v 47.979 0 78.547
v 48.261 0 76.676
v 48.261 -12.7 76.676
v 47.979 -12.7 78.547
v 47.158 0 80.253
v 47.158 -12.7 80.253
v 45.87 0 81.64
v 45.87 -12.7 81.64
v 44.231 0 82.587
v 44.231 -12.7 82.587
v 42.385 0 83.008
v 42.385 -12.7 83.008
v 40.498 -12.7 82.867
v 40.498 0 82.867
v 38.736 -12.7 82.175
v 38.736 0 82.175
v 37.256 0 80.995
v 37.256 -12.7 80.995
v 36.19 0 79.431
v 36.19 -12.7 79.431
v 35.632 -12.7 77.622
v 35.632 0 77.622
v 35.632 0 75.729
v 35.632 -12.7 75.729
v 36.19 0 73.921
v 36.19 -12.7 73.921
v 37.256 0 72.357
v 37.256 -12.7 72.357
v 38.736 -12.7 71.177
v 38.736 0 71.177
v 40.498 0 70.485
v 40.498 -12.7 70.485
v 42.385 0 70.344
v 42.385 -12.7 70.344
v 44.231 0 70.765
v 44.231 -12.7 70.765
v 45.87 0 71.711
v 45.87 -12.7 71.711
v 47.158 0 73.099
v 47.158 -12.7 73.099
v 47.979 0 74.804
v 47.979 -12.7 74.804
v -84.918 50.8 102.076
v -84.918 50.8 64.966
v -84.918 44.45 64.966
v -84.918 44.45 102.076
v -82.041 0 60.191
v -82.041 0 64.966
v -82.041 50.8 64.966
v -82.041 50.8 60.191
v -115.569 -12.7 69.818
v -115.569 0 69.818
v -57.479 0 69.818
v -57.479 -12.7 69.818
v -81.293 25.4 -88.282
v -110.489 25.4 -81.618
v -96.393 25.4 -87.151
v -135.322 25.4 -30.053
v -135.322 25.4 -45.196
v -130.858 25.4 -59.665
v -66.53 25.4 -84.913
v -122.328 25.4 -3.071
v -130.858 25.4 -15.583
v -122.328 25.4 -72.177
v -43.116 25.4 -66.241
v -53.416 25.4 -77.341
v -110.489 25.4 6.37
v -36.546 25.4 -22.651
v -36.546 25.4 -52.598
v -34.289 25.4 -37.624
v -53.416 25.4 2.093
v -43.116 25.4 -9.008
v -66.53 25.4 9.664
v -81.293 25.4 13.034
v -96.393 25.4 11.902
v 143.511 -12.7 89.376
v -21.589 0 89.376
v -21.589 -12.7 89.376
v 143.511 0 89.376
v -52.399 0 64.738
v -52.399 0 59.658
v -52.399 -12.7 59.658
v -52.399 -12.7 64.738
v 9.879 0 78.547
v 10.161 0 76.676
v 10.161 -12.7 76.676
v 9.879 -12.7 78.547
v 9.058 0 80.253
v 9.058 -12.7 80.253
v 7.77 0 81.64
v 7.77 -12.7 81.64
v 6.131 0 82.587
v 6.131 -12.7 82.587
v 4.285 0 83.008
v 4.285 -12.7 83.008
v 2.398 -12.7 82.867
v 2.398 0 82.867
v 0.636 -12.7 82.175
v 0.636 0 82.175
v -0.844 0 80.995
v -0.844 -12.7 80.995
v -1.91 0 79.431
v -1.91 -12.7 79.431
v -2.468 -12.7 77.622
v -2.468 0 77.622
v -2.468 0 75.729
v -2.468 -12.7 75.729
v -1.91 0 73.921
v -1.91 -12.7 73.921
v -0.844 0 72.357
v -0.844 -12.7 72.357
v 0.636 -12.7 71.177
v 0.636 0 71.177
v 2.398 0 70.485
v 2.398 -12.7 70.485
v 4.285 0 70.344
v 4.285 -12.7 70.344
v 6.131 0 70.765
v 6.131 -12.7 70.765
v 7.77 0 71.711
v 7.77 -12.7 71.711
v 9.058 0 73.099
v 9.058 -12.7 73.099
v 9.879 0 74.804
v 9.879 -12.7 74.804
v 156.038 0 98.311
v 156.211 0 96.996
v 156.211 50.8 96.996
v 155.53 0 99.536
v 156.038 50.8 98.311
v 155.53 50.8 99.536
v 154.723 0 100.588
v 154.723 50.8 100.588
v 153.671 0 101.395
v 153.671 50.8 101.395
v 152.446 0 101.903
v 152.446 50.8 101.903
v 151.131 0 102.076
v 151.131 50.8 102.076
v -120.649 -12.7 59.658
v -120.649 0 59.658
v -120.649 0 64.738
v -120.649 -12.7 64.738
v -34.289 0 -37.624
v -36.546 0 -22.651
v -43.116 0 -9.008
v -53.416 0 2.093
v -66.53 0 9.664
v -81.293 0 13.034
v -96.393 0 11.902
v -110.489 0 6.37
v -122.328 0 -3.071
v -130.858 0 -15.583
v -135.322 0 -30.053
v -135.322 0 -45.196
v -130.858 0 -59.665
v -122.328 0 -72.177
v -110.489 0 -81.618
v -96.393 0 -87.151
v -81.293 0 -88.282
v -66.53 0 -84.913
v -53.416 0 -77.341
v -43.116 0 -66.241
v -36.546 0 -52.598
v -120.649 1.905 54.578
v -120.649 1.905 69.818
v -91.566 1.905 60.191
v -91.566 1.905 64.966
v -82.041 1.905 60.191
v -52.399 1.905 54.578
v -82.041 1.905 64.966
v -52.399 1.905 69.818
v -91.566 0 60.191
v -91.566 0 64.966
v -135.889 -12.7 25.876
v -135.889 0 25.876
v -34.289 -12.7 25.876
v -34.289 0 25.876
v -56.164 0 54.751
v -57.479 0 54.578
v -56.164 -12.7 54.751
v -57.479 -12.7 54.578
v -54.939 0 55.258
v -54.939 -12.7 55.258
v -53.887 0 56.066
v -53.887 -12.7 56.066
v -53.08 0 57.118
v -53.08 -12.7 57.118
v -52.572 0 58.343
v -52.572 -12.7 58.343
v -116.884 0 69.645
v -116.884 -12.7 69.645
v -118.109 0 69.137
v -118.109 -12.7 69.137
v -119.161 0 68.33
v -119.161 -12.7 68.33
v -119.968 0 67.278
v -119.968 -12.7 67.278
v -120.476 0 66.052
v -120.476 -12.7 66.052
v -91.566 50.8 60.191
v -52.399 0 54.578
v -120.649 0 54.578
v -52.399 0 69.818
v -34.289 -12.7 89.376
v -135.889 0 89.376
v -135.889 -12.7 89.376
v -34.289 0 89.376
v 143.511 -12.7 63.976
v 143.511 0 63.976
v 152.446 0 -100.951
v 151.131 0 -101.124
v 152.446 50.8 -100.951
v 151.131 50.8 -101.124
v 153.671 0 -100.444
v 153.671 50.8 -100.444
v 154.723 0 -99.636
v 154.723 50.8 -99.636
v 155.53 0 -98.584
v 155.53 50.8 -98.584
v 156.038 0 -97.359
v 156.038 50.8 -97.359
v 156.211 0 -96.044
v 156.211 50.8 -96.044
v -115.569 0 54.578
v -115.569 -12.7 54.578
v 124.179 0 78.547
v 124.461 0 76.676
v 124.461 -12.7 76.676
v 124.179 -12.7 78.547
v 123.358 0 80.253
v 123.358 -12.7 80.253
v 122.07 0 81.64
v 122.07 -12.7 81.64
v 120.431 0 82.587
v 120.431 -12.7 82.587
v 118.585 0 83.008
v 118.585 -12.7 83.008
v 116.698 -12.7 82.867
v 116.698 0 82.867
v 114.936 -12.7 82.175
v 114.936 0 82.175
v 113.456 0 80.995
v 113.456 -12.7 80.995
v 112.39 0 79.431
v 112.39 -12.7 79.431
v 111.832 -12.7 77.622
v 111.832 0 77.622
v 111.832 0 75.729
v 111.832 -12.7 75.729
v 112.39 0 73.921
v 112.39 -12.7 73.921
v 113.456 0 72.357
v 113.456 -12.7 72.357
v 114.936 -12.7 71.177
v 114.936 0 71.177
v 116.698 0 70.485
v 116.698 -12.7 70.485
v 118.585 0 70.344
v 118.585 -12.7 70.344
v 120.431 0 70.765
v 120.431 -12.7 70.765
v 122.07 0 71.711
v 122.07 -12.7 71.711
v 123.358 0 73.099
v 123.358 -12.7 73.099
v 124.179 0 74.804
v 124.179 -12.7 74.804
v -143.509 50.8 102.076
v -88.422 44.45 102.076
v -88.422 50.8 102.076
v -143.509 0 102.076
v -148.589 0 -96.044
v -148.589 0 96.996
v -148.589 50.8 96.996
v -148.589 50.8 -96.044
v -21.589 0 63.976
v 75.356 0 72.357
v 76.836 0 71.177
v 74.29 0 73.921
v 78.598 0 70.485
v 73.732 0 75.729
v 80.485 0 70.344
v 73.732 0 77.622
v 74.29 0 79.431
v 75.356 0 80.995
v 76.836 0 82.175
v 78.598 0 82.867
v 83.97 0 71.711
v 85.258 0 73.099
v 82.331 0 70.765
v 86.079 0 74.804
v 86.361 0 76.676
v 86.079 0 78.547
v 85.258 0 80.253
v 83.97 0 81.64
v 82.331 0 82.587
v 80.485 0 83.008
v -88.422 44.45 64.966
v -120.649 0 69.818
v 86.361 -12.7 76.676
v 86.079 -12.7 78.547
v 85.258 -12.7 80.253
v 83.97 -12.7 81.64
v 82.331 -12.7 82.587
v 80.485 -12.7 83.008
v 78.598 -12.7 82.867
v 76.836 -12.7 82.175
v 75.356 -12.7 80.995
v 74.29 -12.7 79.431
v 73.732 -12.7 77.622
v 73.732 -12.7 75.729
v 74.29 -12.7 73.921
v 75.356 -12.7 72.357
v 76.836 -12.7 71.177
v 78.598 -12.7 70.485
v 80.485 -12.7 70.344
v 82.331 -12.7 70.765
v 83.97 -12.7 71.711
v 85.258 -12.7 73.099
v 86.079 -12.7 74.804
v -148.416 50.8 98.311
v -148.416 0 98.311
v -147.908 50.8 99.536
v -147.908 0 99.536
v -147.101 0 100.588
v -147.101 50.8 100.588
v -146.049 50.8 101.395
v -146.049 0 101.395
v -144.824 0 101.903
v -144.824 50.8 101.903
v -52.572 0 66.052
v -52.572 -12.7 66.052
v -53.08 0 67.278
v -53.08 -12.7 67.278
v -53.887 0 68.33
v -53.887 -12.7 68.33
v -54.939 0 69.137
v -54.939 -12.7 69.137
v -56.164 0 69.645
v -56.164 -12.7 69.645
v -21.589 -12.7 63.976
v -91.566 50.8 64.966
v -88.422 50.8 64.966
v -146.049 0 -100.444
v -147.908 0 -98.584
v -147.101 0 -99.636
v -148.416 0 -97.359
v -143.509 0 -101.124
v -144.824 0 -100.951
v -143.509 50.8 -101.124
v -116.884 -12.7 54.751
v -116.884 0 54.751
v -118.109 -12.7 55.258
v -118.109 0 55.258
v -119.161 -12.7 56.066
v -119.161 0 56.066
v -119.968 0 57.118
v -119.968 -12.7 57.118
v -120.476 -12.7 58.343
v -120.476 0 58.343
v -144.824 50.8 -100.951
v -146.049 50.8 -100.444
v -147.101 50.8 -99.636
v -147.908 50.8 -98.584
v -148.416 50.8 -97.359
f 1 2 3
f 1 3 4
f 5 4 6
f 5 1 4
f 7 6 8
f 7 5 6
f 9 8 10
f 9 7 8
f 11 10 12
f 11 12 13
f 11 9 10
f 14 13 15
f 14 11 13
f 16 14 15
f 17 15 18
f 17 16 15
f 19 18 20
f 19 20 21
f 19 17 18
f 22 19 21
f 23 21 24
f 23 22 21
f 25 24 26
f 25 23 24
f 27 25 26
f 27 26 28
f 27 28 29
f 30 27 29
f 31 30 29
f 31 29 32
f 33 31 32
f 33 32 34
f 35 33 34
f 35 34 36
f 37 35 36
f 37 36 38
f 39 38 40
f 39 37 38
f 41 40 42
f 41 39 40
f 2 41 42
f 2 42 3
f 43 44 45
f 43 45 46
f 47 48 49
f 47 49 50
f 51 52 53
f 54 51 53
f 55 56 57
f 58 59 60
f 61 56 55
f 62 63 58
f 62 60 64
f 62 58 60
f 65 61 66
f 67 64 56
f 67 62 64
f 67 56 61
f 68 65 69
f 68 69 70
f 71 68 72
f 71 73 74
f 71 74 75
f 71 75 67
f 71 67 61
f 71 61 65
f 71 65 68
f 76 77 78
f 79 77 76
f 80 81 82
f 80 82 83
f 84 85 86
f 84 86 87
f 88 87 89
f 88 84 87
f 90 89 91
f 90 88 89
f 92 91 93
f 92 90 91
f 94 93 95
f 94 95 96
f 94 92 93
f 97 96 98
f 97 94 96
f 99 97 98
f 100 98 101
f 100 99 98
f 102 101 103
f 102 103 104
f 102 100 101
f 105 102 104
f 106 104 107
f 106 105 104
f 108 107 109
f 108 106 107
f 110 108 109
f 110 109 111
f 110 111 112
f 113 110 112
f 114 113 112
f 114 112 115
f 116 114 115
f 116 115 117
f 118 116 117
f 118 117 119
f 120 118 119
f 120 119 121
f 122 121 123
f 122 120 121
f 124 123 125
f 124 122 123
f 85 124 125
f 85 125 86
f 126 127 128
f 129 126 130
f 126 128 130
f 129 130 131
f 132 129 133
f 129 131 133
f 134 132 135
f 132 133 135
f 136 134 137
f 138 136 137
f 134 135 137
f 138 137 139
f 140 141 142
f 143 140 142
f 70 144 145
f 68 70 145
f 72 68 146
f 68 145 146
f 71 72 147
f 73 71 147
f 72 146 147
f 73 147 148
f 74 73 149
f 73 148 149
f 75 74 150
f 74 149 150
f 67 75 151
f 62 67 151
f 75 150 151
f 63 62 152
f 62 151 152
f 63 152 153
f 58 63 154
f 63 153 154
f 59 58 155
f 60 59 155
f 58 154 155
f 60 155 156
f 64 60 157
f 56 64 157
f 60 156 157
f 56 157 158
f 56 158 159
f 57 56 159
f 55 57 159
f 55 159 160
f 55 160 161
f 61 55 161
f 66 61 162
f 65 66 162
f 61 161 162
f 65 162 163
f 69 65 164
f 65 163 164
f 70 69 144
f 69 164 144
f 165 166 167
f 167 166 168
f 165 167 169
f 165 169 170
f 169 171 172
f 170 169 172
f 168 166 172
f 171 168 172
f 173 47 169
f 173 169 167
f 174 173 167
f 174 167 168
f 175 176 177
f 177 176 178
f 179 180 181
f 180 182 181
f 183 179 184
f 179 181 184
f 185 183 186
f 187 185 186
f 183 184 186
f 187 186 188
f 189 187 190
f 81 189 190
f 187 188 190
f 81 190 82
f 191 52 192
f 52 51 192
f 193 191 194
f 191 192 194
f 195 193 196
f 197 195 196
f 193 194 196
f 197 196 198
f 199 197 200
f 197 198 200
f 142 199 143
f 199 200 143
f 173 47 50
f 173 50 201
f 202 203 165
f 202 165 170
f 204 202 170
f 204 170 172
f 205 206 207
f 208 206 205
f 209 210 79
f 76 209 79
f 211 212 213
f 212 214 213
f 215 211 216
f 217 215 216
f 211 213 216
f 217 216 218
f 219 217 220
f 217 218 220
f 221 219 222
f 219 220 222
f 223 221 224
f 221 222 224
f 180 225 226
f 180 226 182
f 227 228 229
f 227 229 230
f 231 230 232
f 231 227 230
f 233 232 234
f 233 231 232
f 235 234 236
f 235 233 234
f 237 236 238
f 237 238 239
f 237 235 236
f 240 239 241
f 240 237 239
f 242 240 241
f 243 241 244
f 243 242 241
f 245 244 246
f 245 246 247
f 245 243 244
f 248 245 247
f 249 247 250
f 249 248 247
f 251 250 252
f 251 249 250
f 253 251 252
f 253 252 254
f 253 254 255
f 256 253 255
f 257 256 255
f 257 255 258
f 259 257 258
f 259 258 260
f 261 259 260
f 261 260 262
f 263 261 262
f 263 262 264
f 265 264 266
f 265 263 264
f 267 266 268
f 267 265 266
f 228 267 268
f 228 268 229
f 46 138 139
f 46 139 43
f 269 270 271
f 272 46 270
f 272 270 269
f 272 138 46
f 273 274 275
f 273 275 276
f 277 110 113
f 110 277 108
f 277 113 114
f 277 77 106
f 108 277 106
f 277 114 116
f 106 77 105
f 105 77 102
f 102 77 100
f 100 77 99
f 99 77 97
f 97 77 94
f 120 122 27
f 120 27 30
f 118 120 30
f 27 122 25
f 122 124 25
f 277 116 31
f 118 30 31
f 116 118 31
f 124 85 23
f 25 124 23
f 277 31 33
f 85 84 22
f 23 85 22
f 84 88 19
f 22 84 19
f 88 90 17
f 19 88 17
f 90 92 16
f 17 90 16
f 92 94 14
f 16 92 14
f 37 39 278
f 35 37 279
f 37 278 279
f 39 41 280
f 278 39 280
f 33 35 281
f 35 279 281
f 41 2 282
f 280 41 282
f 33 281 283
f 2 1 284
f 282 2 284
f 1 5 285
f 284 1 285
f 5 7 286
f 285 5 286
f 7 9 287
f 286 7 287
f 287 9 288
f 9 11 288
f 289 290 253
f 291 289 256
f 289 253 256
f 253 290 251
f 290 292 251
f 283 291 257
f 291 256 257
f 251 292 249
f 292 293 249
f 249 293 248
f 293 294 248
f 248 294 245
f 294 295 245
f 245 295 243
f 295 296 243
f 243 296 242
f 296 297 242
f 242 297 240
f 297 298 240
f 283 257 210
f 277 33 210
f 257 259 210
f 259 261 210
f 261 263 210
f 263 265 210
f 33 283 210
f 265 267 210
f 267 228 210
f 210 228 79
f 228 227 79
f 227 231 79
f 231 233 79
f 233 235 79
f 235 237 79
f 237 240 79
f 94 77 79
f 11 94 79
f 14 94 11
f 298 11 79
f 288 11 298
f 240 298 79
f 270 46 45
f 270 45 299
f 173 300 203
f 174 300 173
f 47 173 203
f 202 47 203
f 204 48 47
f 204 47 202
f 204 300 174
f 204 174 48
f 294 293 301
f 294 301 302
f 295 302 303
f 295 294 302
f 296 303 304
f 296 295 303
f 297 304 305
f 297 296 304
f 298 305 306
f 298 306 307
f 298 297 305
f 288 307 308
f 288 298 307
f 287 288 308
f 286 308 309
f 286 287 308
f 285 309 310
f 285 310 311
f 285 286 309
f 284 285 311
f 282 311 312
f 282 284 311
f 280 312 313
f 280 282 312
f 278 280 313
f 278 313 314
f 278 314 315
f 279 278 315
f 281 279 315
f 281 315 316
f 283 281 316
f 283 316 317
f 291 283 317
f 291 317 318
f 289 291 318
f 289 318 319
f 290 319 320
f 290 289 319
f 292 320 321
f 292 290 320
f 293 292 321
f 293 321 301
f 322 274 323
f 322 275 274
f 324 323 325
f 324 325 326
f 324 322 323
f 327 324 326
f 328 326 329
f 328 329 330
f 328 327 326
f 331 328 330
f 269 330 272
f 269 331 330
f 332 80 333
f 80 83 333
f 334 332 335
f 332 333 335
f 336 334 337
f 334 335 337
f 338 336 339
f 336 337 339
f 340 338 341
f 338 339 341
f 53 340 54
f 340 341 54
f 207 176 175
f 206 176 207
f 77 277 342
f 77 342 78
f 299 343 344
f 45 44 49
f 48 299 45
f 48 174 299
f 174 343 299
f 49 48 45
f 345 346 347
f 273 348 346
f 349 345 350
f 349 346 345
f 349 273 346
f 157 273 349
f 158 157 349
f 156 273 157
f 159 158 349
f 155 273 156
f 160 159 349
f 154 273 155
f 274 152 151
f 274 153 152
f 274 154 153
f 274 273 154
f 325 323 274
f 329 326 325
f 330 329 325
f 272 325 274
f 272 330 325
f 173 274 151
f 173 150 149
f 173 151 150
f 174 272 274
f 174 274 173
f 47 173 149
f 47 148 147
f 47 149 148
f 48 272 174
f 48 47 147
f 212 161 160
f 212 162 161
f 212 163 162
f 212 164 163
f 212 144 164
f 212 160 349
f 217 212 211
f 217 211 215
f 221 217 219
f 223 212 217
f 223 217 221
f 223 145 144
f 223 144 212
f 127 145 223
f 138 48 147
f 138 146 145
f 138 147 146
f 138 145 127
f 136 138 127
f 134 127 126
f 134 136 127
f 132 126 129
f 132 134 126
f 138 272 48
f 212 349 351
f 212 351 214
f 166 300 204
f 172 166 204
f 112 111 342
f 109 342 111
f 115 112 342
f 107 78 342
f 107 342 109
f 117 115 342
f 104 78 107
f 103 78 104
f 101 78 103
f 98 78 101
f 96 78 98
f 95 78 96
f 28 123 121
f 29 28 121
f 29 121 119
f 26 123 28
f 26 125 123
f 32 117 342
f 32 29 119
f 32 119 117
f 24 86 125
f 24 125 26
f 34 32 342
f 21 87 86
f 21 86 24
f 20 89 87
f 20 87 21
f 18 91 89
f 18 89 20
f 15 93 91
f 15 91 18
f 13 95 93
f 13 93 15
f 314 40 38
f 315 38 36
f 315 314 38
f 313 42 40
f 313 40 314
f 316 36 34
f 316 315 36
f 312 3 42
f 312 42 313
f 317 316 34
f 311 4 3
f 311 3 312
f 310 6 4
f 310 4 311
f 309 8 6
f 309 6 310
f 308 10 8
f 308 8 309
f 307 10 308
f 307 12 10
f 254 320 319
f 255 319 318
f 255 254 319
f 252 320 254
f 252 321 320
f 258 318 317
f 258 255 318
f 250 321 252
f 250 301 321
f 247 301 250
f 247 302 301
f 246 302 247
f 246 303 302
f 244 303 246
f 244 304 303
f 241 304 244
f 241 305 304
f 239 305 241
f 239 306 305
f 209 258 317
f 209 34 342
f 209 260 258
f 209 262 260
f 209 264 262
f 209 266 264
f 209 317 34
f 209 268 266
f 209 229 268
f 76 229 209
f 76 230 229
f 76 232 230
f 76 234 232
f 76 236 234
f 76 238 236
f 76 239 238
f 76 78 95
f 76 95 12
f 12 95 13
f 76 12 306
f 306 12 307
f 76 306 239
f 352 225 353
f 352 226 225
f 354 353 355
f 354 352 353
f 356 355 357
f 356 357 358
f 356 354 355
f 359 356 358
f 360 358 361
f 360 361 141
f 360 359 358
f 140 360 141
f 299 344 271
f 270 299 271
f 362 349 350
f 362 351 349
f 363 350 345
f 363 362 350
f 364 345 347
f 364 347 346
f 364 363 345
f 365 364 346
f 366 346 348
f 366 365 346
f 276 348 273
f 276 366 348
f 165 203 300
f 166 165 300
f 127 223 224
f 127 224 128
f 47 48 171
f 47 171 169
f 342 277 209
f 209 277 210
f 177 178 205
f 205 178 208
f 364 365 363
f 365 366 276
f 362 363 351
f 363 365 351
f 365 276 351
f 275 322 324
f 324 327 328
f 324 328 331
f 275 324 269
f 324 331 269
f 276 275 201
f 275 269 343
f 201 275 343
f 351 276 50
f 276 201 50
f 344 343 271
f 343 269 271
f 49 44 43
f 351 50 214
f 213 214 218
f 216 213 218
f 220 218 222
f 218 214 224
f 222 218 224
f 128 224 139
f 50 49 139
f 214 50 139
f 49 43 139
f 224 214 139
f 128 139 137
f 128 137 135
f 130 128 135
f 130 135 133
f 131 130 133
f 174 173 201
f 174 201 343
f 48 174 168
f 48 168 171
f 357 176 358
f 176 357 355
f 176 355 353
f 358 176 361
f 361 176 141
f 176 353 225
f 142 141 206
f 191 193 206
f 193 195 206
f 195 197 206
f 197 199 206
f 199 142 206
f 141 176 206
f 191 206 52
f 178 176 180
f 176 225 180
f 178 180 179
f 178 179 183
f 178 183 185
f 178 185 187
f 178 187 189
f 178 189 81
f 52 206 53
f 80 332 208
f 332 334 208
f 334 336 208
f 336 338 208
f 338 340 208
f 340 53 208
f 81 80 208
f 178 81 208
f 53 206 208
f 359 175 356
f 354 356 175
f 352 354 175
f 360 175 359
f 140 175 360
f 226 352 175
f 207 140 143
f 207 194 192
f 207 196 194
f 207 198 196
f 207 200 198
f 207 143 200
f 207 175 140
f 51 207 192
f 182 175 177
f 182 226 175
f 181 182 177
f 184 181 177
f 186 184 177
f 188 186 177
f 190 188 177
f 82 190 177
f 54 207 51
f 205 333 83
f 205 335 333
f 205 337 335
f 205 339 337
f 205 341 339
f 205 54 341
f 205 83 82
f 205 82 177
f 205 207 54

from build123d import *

# Parameters (mm, degrees)
F4_W      = 101.6
F4_H      = 63.5
F4_W_2    = 68.2498
F4_H_2    = 15.24
F5_DEPTH  = 12.7
F6_DEPTH  = 1.905
F3_W      = 165.1
F3_H      = 25.4
F3_R      = 6.35
F7_DEPTH  = 12.7
F8_DEPTH  = 50.8
F1_R      = 50.8
F9_DEPTH  = 25.4
F10_R     = 5.08
F11_R     = 5.08
F12_R     = 5.08
F13_R     = 5.08
F14_W     = 3.503367
F14_H     = 37.1094
F15_DEPTH = 6.35
F16_R     = 5.08


with BuildPart() as f5:
    # F4 (on face) → F5 (new body)
    with BuildSketch(Plane.XZ):
        with Locations((-85.089087, 57.625801)):
            Rectangle(F4_W, F4_H)
        with Locations((-86.524187, 62.197683)):
            Rectangle(F4_W_2, F4_H_2, mode=Mode.SUBTRACT)
    extrude(amount=F5_DEPTH)

    # F16
    f16_edges = [f5.edges().sort_by_distance(p)[0] for p in [
        (-120.649087, -6.35, 69.817683),
        (-52.399287, -6.35, 69.817683),
        (-120.649087, -6.35, 54.577683),
        (-52.399287, -6.35, 54.577683),
    ]]
    fillet(f16_edges, radius=F16_R)


with BuildPart() as f6:
    # F4 (on face) → F6 (new body)
    with BuildSketch(Plane.XZ):
        with Locations((-86.524187, 62.197683)):
            Rectangle(F4_W_2, F4_H_2)
        Polygon((-82.041087, 60.191201), (-91.566087, 60.191201), (-91.566087, 64.966401), (-88.340287, 64.966401), (-85.292287, 64.966401), (-82.041087, 64.966401), align=None, mode=Mode.SUBTRACT)
    extrude(amount=-F6_DEPTH)


with BuildPart() as f7:
    # F3 (on face) → F7 (new body)
    with BuildSketch(Plane.XZ):
        with Locations((60.960913, 76.675801)):
            Rectangle(F3_W, F3_H)
        with Locations((3.810913, 76.675801)):
            Circle(F3_R, mode=Mode.SUBTRACT)
        with Locations((41.910913, 76.675801)):
            Circle(F3_R, mode=Mode.SUBTRACT)
        with Locations((80.010913, 76.675801)):
            Circle(F3_R, mode=Mode.SUBTRACT)
        with Locations((118.110913, 76.675801)):
            Circle(F3_R, mode=Mode.SUBTRACT)
    extrude(amount=F7_DEPTH)


with BuildPart() as f8:
    # F0 (on Front) → F8 (new body)
    with BuildSketch(Plane.XZ):
        Polygon((-148.589087, -101.124199), (156.210913, -101.124199), (156.210913, 102.075801), (-85.292287, 102.075801), (-88.340287, 102.075801), (-148.589087, 102.075801), align=None)
        Polygon((-91.566087, 60.191201), (-91.566087, 64.966401), (-88.340287, 64.966401), (-85.292287, 64.966401), (-82.041087, 64.966401), (-82.041087, 60.191201), align=None, mode=Mode.SUBTRACT)
    extrude(amount=-F8_DEPTH)

    # F1 (on face) → F9 (cut)
    with BuildSketch(Plane.XZ):
        with Locations((-85.089087, -37.624199)):
            Circle(F1_R)
    extrude(amount=-F9_DEPTH, mode=Mode.SUBTRACT)

    # F10
    f10_edges = [f8.edges().sort_by_distance(p)[0] for p in [
        (156.210913, 25.4, -101.124199),
    ]]
    fillet(f10_edges, radius=F10_R)

    # F11
    f11_edges = [f8.edges().sort_by_distance(p)[0] for p in [
        (156.210913, 25.4, 102.075801),
    ]]
    fillet(f11_edges, radius=F11_R)

    # F12
    f12_edges = [f8.edges().sort_by_distance(p)[0] for p in [
        (-148.589087, 25.4, -101.124199),
    ]]
    fillet(f12_edges, radius=F12_R)

    # F13
    f13_edges = [f8.edges().sort_by_distance(p)[0] for p in [
        (-148.589087, 25.4, 102.075801),
    ]]
    fillet(f13_edges, radius=F13_R)

    # F14 (on face) → F15 (cut)
    with BuildSketch(Plane(origin=(0, 50.8, 0), x_dir=(-1, 0, 0), z_dir=(0, 1, 0))):
        with Locations((86.669877, 83.521101)):
            Rectangle(F14_W, F14_H)
    extrude(amount=-F15_DEPTH, mode=Mode.SUBTRACT)


solid = Compound([f5.part, f6.part, f7.part, f8.part])
